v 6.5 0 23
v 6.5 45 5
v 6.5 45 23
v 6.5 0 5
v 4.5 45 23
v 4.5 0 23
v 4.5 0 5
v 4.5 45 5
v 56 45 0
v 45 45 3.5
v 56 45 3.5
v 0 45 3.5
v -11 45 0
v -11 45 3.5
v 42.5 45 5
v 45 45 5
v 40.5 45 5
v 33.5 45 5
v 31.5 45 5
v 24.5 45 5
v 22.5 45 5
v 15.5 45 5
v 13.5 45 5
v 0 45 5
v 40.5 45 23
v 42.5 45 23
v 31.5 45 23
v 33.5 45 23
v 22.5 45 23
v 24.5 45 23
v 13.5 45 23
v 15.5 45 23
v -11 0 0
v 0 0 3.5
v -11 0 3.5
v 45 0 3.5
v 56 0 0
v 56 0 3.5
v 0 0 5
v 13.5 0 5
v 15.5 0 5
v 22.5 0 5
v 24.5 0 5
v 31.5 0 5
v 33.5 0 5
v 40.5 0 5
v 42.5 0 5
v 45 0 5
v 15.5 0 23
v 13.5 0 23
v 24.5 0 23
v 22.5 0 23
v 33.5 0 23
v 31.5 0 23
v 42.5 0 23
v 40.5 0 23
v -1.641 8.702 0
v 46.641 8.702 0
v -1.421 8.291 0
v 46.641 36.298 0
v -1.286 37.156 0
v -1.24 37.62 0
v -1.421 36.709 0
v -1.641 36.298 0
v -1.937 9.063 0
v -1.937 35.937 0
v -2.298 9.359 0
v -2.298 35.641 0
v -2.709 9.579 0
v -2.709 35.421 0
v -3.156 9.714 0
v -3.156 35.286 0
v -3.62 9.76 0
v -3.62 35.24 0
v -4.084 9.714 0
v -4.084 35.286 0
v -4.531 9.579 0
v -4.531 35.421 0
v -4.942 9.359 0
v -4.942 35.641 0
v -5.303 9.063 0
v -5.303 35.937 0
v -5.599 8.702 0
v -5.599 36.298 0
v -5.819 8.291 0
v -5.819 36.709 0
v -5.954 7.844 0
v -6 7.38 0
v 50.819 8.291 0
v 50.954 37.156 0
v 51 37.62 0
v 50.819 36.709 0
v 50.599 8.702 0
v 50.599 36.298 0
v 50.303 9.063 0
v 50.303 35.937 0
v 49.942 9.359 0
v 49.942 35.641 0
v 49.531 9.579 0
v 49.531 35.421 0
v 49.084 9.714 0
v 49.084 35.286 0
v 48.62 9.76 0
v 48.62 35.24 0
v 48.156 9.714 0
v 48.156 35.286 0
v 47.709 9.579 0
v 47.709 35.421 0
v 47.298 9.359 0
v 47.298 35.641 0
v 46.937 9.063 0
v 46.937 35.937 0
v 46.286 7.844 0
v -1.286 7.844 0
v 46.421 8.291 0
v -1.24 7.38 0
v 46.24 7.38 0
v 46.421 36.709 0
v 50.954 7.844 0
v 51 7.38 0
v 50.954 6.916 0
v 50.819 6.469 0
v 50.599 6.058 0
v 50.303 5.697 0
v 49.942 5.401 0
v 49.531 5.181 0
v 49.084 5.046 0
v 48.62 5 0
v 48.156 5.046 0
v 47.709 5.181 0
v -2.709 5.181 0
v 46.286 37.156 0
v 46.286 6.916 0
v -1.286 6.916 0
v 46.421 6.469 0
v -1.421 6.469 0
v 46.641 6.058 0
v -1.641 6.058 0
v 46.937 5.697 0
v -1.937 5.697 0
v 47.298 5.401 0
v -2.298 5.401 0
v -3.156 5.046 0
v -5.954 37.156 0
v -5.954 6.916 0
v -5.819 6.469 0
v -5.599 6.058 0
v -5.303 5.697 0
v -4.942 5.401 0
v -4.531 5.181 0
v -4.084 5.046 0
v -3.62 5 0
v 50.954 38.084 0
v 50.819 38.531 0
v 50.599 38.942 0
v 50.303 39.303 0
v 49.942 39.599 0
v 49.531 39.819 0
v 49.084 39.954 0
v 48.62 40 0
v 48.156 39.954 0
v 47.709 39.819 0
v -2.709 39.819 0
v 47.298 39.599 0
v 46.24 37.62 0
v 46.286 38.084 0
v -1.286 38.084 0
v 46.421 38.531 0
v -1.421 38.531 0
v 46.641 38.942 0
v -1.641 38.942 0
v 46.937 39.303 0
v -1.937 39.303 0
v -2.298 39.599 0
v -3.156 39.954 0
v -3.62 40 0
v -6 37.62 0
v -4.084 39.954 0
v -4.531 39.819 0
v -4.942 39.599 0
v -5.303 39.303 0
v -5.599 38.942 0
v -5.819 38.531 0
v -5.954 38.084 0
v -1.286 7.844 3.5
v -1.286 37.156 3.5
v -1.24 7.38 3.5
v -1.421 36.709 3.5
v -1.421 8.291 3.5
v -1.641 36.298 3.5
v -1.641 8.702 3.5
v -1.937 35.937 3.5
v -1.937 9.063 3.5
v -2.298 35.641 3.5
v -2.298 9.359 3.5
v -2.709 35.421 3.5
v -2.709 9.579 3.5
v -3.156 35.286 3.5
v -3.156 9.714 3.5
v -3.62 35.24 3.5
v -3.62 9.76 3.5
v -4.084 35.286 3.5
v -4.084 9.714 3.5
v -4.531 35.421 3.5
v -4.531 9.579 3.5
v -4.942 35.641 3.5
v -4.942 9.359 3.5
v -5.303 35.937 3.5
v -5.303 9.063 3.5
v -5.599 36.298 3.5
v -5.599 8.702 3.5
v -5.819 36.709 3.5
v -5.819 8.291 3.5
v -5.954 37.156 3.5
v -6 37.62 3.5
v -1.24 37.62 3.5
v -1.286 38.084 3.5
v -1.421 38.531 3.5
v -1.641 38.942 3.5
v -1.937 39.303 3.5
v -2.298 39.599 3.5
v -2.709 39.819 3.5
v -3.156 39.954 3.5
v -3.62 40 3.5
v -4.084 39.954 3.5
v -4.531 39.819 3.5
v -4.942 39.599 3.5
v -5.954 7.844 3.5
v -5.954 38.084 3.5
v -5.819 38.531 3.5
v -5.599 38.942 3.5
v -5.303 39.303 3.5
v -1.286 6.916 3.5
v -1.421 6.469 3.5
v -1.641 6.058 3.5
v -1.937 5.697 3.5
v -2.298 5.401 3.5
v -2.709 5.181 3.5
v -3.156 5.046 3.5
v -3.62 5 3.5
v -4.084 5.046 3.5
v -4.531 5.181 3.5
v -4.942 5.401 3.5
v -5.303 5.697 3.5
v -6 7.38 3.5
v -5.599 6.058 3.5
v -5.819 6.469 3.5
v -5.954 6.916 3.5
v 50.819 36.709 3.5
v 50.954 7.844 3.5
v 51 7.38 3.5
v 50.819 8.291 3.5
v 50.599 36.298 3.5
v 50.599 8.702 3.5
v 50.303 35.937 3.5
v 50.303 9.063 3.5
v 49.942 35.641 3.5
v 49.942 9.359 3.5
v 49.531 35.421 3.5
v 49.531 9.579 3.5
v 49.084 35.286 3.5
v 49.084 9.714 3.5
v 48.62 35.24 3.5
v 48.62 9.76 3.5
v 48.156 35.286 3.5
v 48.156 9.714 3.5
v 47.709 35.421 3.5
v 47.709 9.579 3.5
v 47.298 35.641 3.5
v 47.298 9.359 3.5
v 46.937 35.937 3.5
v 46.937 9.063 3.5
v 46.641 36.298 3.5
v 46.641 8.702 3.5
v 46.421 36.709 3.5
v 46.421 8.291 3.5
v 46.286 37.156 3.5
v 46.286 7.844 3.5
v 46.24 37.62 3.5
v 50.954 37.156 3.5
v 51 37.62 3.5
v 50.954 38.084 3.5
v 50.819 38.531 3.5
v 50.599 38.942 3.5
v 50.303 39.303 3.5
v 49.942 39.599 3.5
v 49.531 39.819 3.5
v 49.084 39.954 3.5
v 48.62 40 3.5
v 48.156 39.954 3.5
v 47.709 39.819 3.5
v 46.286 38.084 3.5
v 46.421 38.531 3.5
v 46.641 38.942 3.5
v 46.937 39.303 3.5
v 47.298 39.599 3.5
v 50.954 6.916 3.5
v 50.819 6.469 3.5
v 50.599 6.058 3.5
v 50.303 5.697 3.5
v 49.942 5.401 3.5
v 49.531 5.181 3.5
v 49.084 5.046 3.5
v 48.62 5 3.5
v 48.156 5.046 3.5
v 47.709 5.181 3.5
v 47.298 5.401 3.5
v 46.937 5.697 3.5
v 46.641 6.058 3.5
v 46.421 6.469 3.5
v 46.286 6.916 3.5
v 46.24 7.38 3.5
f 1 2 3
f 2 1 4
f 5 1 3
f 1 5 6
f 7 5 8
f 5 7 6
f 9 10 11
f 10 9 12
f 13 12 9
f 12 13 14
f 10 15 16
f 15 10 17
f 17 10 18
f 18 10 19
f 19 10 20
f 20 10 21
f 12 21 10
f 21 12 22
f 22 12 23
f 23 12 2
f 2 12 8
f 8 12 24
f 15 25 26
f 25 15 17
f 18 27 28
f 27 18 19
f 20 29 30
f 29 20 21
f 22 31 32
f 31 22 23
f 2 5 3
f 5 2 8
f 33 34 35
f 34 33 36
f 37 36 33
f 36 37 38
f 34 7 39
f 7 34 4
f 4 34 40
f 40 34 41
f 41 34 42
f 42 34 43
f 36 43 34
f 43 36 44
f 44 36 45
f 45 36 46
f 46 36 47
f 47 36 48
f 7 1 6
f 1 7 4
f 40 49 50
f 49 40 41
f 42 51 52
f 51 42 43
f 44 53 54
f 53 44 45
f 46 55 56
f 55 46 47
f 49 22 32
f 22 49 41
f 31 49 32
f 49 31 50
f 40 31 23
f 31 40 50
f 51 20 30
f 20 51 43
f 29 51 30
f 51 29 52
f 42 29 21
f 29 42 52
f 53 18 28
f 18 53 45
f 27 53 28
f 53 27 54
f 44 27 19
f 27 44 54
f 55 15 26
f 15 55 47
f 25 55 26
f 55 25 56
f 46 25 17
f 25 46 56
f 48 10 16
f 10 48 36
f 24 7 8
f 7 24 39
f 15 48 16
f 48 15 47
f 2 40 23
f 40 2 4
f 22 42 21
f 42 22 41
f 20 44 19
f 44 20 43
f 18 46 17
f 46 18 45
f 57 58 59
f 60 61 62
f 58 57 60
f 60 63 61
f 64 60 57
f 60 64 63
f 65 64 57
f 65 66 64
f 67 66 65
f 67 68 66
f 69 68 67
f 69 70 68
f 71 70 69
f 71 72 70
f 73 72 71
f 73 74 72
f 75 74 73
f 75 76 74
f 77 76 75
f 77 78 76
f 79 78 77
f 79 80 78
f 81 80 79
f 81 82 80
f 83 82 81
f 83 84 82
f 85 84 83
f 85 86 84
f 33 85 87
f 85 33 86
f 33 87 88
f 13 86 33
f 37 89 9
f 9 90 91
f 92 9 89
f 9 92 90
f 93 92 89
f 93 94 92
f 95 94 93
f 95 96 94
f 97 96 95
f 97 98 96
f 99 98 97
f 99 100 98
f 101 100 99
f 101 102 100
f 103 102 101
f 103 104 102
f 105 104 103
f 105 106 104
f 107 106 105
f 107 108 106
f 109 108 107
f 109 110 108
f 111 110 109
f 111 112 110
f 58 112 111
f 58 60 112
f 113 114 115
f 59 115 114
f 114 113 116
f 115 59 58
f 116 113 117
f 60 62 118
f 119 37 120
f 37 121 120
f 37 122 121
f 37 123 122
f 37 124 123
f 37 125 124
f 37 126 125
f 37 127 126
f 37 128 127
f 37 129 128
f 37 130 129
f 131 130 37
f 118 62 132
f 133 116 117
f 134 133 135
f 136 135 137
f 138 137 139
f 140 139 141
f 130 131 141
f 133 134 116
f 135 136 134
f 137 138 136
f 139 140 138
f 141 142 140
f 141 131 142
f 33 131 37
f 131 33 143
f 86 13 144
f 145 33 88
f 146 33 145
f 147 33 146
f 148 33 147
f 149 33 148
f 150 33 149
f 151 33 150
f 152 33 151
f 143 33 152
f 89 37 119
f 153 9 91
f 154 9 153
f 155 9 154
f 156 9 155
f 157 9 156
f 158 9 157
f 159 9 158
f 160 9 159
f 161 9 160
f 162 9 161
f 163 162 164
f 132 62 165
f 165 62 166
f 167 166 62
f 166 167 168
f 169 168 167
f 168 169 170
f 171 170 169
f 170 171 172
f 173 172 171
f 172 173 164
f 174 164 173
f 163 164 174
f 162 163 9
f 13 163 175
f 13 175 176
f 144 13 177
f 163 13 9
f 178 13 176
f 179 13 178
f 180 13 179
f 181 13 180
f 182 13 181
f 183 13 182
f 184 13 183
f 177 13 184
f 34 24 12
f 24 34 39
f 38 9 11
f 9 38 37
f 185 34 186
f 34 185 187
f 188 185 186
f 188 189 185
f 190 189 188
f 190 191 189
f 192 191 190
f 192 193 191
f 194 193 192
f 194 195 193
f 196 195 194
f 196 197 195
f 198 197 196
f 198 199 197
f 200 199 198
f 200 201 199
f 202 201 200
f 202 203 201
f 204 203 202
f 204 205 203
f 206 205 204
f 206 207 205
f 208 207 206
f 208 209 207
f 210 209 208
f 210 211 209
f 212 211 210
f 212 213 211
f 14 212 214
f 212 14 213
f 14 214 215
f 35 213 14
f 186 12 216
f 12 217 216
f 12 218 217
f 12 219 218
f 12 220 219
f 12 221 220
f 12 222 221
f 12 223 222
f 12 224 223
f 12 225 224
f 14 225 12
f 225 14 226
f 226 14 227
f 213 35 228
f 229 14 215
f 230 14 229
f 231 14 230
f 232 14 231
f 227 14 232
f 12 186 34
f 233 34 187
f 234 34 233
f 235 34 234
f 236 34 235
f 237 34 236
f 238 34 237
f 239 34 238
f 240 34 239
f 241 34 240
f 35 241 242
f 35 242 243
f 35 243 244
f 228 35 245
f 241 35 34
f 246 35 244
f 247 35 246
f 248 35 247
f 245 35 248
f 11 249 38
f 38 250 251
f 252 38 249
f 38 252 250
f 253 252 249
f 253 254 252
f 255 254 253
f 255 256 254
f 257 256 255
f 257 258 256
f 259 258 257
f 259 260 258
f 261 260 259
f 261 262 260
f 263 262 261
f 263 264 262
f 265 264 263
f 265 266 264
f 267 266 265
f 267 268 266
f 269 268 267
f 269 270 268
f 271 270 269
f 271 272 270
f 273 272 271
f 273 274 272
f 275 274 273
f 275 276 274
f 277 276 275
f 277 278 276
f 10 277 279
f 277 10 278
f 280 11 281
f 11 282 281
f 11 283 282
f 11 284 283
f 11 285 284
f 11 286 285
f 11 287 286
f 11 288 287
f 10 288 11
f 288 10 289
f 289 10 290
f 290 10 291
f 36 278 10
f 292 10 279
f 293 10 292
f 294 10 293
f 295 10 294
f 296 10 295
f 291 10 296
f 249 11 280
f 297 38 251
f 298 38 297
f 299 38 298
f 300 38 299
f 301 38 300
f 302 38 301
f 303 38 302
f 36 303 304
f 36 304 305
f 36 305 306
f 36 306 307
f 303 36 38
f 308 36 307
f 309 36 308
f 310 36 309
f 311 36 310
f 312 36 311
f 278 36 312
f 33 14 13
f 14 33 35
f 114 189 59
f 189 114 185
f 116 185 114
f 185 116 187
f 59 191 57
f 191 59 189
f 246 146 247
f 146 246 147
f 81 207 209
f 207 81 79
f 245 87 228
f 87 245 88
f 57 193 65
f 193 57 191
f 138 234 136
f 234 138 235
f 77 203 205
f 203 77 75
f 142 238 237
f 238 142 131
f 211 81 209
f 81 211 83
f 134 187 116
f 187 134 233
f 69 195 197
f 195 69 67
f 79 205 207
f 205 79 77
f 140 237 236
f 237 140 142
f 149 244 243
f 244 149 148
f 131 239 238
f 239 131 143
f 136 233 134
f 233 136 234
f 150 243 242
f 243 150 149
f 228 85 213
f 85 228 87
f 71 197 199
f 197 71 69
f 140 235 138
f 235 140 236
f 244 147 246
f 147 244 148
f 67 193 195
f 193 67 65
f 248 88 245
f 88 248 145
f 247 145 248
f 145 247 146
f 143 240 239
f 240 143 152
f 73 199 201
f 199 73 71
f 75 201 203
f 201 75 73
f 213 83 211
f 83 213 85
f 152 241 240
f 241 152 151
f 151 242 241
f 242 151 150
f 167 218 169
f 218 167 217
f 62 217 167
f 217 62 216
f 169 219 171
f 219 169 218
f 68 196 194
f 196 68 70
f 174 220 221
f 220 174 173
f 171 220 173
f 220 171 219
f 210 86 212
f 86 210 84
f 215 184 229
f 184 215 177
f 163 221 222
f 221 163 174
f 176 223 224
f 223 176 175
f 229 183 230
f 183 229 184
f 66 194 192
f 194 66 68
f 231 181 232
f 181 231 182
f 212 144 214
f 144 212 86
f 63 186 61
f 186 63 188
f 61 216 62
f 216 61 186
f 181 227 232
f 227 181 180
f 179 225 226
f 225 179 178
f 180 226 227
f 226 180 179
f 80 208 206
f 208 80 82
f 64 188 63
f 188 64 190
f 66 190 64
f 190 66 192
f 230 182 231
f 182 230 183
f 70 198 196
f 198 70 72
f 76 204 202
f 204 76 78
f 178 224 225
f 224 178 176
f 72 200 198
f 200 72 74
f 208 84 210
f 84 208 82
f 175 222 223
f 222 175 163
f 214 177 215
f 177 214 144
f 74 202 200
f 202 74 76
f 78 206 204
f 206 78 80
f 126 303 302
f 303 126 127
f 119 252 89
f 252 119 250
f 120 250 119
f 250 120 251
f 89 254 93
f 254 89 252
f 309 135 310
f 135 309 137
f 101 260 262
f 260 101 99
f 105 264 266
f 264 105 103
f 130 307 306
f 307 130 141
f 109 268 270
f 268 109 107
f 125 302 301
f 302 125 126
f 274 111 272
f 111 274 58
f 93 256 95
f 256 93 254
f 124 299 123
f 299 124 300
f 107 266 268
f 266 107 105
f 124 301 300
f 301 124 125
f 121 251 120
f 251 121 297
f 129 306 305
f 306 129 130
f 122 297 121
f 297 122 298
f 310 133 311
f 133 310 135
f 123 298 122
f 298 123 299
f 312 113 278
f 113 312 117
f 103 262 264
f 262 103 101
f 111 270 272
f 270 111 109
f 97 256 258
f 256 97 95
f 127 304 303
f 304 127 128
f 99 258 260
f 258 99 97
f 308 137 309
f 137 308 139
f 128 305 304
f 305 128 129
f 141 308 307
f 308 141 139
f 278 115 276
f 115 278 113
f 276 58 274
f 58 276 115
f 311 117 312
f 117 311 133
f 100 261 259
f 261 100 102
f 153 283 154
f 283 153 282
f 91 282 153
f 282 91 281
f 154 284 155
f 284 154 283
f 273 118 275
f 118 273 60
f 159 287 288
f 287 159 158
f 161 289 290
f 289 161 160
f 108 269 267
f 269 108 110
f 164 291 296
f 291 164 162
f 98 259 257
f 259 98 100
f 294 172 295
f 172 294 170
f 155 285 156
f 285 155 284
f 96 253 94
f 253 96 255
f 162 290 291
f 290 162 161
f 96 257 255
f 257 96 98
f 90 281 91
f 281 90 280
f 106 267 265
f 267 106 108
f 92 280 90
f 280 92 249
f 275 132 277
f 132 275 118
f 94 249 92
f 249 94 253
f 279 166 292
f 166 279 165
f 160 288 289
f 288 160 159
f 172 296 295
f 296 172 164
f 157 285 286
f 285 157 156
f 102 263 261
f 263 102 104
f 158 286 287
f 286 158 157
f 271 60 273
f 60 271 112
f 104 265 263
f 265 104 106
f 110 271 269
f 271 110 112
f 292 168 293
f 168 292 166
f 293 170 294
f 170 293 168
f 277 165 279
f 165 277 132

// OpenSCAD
$fn = 32;

// ----------------------------------------------------------------------
// Finned heat sink: 45 x 45 mm base, 18 mm fins
// ----------------------------------------------------------------------

// --- parameters (mm) ---
base_w = 45;              // base width
base_d = 45;              // base depth
base_t = 5;               // base thickness
fin_h = 18;               // fin height above the base
holes_d = 4.76;           // fixing holes
hole_x = 26.12;           // hole offset in x
hole_y = 15.12;           // hole offset in y
fin_t = 2;                // fin thickness
fin_pitch = 9;            // fin pitch
fin_count = 5;            // number of fins
fin_x0 = 4.5;             // first fin offset
flange_w = 67;            // flange plate width
flange_t = 3;             // flange plate thickness

difference() {
  union() {
    cube([base_w, base_d, base_t]);
    for (i = [0 : fin_count - 1]) {
      translate([fin_x0 + i * fin_pitch, 0, base_t - 0.5]) cube([fin_t, base_d, fin_h + 0.5]);
    }
    /* mounting flange, a wider plate sharing the base bottom */
    translate([(base_w - flange_w) / 2, 0, 0]) cube([flange_w, base_d, flange_t + 0.5]);
  }
  /* fixing holes through the base, 2.5 mm clear on both sides */
  for (hx = [-26.12, 26.12]) {
    for (hy = [-15.12, 15.12]) {
      translate([base_w / 2 + hx, base_d / 2 + hy, -2.5]) cylinder(h = base_t + 5, d = holes_d);
    }
  }
}
